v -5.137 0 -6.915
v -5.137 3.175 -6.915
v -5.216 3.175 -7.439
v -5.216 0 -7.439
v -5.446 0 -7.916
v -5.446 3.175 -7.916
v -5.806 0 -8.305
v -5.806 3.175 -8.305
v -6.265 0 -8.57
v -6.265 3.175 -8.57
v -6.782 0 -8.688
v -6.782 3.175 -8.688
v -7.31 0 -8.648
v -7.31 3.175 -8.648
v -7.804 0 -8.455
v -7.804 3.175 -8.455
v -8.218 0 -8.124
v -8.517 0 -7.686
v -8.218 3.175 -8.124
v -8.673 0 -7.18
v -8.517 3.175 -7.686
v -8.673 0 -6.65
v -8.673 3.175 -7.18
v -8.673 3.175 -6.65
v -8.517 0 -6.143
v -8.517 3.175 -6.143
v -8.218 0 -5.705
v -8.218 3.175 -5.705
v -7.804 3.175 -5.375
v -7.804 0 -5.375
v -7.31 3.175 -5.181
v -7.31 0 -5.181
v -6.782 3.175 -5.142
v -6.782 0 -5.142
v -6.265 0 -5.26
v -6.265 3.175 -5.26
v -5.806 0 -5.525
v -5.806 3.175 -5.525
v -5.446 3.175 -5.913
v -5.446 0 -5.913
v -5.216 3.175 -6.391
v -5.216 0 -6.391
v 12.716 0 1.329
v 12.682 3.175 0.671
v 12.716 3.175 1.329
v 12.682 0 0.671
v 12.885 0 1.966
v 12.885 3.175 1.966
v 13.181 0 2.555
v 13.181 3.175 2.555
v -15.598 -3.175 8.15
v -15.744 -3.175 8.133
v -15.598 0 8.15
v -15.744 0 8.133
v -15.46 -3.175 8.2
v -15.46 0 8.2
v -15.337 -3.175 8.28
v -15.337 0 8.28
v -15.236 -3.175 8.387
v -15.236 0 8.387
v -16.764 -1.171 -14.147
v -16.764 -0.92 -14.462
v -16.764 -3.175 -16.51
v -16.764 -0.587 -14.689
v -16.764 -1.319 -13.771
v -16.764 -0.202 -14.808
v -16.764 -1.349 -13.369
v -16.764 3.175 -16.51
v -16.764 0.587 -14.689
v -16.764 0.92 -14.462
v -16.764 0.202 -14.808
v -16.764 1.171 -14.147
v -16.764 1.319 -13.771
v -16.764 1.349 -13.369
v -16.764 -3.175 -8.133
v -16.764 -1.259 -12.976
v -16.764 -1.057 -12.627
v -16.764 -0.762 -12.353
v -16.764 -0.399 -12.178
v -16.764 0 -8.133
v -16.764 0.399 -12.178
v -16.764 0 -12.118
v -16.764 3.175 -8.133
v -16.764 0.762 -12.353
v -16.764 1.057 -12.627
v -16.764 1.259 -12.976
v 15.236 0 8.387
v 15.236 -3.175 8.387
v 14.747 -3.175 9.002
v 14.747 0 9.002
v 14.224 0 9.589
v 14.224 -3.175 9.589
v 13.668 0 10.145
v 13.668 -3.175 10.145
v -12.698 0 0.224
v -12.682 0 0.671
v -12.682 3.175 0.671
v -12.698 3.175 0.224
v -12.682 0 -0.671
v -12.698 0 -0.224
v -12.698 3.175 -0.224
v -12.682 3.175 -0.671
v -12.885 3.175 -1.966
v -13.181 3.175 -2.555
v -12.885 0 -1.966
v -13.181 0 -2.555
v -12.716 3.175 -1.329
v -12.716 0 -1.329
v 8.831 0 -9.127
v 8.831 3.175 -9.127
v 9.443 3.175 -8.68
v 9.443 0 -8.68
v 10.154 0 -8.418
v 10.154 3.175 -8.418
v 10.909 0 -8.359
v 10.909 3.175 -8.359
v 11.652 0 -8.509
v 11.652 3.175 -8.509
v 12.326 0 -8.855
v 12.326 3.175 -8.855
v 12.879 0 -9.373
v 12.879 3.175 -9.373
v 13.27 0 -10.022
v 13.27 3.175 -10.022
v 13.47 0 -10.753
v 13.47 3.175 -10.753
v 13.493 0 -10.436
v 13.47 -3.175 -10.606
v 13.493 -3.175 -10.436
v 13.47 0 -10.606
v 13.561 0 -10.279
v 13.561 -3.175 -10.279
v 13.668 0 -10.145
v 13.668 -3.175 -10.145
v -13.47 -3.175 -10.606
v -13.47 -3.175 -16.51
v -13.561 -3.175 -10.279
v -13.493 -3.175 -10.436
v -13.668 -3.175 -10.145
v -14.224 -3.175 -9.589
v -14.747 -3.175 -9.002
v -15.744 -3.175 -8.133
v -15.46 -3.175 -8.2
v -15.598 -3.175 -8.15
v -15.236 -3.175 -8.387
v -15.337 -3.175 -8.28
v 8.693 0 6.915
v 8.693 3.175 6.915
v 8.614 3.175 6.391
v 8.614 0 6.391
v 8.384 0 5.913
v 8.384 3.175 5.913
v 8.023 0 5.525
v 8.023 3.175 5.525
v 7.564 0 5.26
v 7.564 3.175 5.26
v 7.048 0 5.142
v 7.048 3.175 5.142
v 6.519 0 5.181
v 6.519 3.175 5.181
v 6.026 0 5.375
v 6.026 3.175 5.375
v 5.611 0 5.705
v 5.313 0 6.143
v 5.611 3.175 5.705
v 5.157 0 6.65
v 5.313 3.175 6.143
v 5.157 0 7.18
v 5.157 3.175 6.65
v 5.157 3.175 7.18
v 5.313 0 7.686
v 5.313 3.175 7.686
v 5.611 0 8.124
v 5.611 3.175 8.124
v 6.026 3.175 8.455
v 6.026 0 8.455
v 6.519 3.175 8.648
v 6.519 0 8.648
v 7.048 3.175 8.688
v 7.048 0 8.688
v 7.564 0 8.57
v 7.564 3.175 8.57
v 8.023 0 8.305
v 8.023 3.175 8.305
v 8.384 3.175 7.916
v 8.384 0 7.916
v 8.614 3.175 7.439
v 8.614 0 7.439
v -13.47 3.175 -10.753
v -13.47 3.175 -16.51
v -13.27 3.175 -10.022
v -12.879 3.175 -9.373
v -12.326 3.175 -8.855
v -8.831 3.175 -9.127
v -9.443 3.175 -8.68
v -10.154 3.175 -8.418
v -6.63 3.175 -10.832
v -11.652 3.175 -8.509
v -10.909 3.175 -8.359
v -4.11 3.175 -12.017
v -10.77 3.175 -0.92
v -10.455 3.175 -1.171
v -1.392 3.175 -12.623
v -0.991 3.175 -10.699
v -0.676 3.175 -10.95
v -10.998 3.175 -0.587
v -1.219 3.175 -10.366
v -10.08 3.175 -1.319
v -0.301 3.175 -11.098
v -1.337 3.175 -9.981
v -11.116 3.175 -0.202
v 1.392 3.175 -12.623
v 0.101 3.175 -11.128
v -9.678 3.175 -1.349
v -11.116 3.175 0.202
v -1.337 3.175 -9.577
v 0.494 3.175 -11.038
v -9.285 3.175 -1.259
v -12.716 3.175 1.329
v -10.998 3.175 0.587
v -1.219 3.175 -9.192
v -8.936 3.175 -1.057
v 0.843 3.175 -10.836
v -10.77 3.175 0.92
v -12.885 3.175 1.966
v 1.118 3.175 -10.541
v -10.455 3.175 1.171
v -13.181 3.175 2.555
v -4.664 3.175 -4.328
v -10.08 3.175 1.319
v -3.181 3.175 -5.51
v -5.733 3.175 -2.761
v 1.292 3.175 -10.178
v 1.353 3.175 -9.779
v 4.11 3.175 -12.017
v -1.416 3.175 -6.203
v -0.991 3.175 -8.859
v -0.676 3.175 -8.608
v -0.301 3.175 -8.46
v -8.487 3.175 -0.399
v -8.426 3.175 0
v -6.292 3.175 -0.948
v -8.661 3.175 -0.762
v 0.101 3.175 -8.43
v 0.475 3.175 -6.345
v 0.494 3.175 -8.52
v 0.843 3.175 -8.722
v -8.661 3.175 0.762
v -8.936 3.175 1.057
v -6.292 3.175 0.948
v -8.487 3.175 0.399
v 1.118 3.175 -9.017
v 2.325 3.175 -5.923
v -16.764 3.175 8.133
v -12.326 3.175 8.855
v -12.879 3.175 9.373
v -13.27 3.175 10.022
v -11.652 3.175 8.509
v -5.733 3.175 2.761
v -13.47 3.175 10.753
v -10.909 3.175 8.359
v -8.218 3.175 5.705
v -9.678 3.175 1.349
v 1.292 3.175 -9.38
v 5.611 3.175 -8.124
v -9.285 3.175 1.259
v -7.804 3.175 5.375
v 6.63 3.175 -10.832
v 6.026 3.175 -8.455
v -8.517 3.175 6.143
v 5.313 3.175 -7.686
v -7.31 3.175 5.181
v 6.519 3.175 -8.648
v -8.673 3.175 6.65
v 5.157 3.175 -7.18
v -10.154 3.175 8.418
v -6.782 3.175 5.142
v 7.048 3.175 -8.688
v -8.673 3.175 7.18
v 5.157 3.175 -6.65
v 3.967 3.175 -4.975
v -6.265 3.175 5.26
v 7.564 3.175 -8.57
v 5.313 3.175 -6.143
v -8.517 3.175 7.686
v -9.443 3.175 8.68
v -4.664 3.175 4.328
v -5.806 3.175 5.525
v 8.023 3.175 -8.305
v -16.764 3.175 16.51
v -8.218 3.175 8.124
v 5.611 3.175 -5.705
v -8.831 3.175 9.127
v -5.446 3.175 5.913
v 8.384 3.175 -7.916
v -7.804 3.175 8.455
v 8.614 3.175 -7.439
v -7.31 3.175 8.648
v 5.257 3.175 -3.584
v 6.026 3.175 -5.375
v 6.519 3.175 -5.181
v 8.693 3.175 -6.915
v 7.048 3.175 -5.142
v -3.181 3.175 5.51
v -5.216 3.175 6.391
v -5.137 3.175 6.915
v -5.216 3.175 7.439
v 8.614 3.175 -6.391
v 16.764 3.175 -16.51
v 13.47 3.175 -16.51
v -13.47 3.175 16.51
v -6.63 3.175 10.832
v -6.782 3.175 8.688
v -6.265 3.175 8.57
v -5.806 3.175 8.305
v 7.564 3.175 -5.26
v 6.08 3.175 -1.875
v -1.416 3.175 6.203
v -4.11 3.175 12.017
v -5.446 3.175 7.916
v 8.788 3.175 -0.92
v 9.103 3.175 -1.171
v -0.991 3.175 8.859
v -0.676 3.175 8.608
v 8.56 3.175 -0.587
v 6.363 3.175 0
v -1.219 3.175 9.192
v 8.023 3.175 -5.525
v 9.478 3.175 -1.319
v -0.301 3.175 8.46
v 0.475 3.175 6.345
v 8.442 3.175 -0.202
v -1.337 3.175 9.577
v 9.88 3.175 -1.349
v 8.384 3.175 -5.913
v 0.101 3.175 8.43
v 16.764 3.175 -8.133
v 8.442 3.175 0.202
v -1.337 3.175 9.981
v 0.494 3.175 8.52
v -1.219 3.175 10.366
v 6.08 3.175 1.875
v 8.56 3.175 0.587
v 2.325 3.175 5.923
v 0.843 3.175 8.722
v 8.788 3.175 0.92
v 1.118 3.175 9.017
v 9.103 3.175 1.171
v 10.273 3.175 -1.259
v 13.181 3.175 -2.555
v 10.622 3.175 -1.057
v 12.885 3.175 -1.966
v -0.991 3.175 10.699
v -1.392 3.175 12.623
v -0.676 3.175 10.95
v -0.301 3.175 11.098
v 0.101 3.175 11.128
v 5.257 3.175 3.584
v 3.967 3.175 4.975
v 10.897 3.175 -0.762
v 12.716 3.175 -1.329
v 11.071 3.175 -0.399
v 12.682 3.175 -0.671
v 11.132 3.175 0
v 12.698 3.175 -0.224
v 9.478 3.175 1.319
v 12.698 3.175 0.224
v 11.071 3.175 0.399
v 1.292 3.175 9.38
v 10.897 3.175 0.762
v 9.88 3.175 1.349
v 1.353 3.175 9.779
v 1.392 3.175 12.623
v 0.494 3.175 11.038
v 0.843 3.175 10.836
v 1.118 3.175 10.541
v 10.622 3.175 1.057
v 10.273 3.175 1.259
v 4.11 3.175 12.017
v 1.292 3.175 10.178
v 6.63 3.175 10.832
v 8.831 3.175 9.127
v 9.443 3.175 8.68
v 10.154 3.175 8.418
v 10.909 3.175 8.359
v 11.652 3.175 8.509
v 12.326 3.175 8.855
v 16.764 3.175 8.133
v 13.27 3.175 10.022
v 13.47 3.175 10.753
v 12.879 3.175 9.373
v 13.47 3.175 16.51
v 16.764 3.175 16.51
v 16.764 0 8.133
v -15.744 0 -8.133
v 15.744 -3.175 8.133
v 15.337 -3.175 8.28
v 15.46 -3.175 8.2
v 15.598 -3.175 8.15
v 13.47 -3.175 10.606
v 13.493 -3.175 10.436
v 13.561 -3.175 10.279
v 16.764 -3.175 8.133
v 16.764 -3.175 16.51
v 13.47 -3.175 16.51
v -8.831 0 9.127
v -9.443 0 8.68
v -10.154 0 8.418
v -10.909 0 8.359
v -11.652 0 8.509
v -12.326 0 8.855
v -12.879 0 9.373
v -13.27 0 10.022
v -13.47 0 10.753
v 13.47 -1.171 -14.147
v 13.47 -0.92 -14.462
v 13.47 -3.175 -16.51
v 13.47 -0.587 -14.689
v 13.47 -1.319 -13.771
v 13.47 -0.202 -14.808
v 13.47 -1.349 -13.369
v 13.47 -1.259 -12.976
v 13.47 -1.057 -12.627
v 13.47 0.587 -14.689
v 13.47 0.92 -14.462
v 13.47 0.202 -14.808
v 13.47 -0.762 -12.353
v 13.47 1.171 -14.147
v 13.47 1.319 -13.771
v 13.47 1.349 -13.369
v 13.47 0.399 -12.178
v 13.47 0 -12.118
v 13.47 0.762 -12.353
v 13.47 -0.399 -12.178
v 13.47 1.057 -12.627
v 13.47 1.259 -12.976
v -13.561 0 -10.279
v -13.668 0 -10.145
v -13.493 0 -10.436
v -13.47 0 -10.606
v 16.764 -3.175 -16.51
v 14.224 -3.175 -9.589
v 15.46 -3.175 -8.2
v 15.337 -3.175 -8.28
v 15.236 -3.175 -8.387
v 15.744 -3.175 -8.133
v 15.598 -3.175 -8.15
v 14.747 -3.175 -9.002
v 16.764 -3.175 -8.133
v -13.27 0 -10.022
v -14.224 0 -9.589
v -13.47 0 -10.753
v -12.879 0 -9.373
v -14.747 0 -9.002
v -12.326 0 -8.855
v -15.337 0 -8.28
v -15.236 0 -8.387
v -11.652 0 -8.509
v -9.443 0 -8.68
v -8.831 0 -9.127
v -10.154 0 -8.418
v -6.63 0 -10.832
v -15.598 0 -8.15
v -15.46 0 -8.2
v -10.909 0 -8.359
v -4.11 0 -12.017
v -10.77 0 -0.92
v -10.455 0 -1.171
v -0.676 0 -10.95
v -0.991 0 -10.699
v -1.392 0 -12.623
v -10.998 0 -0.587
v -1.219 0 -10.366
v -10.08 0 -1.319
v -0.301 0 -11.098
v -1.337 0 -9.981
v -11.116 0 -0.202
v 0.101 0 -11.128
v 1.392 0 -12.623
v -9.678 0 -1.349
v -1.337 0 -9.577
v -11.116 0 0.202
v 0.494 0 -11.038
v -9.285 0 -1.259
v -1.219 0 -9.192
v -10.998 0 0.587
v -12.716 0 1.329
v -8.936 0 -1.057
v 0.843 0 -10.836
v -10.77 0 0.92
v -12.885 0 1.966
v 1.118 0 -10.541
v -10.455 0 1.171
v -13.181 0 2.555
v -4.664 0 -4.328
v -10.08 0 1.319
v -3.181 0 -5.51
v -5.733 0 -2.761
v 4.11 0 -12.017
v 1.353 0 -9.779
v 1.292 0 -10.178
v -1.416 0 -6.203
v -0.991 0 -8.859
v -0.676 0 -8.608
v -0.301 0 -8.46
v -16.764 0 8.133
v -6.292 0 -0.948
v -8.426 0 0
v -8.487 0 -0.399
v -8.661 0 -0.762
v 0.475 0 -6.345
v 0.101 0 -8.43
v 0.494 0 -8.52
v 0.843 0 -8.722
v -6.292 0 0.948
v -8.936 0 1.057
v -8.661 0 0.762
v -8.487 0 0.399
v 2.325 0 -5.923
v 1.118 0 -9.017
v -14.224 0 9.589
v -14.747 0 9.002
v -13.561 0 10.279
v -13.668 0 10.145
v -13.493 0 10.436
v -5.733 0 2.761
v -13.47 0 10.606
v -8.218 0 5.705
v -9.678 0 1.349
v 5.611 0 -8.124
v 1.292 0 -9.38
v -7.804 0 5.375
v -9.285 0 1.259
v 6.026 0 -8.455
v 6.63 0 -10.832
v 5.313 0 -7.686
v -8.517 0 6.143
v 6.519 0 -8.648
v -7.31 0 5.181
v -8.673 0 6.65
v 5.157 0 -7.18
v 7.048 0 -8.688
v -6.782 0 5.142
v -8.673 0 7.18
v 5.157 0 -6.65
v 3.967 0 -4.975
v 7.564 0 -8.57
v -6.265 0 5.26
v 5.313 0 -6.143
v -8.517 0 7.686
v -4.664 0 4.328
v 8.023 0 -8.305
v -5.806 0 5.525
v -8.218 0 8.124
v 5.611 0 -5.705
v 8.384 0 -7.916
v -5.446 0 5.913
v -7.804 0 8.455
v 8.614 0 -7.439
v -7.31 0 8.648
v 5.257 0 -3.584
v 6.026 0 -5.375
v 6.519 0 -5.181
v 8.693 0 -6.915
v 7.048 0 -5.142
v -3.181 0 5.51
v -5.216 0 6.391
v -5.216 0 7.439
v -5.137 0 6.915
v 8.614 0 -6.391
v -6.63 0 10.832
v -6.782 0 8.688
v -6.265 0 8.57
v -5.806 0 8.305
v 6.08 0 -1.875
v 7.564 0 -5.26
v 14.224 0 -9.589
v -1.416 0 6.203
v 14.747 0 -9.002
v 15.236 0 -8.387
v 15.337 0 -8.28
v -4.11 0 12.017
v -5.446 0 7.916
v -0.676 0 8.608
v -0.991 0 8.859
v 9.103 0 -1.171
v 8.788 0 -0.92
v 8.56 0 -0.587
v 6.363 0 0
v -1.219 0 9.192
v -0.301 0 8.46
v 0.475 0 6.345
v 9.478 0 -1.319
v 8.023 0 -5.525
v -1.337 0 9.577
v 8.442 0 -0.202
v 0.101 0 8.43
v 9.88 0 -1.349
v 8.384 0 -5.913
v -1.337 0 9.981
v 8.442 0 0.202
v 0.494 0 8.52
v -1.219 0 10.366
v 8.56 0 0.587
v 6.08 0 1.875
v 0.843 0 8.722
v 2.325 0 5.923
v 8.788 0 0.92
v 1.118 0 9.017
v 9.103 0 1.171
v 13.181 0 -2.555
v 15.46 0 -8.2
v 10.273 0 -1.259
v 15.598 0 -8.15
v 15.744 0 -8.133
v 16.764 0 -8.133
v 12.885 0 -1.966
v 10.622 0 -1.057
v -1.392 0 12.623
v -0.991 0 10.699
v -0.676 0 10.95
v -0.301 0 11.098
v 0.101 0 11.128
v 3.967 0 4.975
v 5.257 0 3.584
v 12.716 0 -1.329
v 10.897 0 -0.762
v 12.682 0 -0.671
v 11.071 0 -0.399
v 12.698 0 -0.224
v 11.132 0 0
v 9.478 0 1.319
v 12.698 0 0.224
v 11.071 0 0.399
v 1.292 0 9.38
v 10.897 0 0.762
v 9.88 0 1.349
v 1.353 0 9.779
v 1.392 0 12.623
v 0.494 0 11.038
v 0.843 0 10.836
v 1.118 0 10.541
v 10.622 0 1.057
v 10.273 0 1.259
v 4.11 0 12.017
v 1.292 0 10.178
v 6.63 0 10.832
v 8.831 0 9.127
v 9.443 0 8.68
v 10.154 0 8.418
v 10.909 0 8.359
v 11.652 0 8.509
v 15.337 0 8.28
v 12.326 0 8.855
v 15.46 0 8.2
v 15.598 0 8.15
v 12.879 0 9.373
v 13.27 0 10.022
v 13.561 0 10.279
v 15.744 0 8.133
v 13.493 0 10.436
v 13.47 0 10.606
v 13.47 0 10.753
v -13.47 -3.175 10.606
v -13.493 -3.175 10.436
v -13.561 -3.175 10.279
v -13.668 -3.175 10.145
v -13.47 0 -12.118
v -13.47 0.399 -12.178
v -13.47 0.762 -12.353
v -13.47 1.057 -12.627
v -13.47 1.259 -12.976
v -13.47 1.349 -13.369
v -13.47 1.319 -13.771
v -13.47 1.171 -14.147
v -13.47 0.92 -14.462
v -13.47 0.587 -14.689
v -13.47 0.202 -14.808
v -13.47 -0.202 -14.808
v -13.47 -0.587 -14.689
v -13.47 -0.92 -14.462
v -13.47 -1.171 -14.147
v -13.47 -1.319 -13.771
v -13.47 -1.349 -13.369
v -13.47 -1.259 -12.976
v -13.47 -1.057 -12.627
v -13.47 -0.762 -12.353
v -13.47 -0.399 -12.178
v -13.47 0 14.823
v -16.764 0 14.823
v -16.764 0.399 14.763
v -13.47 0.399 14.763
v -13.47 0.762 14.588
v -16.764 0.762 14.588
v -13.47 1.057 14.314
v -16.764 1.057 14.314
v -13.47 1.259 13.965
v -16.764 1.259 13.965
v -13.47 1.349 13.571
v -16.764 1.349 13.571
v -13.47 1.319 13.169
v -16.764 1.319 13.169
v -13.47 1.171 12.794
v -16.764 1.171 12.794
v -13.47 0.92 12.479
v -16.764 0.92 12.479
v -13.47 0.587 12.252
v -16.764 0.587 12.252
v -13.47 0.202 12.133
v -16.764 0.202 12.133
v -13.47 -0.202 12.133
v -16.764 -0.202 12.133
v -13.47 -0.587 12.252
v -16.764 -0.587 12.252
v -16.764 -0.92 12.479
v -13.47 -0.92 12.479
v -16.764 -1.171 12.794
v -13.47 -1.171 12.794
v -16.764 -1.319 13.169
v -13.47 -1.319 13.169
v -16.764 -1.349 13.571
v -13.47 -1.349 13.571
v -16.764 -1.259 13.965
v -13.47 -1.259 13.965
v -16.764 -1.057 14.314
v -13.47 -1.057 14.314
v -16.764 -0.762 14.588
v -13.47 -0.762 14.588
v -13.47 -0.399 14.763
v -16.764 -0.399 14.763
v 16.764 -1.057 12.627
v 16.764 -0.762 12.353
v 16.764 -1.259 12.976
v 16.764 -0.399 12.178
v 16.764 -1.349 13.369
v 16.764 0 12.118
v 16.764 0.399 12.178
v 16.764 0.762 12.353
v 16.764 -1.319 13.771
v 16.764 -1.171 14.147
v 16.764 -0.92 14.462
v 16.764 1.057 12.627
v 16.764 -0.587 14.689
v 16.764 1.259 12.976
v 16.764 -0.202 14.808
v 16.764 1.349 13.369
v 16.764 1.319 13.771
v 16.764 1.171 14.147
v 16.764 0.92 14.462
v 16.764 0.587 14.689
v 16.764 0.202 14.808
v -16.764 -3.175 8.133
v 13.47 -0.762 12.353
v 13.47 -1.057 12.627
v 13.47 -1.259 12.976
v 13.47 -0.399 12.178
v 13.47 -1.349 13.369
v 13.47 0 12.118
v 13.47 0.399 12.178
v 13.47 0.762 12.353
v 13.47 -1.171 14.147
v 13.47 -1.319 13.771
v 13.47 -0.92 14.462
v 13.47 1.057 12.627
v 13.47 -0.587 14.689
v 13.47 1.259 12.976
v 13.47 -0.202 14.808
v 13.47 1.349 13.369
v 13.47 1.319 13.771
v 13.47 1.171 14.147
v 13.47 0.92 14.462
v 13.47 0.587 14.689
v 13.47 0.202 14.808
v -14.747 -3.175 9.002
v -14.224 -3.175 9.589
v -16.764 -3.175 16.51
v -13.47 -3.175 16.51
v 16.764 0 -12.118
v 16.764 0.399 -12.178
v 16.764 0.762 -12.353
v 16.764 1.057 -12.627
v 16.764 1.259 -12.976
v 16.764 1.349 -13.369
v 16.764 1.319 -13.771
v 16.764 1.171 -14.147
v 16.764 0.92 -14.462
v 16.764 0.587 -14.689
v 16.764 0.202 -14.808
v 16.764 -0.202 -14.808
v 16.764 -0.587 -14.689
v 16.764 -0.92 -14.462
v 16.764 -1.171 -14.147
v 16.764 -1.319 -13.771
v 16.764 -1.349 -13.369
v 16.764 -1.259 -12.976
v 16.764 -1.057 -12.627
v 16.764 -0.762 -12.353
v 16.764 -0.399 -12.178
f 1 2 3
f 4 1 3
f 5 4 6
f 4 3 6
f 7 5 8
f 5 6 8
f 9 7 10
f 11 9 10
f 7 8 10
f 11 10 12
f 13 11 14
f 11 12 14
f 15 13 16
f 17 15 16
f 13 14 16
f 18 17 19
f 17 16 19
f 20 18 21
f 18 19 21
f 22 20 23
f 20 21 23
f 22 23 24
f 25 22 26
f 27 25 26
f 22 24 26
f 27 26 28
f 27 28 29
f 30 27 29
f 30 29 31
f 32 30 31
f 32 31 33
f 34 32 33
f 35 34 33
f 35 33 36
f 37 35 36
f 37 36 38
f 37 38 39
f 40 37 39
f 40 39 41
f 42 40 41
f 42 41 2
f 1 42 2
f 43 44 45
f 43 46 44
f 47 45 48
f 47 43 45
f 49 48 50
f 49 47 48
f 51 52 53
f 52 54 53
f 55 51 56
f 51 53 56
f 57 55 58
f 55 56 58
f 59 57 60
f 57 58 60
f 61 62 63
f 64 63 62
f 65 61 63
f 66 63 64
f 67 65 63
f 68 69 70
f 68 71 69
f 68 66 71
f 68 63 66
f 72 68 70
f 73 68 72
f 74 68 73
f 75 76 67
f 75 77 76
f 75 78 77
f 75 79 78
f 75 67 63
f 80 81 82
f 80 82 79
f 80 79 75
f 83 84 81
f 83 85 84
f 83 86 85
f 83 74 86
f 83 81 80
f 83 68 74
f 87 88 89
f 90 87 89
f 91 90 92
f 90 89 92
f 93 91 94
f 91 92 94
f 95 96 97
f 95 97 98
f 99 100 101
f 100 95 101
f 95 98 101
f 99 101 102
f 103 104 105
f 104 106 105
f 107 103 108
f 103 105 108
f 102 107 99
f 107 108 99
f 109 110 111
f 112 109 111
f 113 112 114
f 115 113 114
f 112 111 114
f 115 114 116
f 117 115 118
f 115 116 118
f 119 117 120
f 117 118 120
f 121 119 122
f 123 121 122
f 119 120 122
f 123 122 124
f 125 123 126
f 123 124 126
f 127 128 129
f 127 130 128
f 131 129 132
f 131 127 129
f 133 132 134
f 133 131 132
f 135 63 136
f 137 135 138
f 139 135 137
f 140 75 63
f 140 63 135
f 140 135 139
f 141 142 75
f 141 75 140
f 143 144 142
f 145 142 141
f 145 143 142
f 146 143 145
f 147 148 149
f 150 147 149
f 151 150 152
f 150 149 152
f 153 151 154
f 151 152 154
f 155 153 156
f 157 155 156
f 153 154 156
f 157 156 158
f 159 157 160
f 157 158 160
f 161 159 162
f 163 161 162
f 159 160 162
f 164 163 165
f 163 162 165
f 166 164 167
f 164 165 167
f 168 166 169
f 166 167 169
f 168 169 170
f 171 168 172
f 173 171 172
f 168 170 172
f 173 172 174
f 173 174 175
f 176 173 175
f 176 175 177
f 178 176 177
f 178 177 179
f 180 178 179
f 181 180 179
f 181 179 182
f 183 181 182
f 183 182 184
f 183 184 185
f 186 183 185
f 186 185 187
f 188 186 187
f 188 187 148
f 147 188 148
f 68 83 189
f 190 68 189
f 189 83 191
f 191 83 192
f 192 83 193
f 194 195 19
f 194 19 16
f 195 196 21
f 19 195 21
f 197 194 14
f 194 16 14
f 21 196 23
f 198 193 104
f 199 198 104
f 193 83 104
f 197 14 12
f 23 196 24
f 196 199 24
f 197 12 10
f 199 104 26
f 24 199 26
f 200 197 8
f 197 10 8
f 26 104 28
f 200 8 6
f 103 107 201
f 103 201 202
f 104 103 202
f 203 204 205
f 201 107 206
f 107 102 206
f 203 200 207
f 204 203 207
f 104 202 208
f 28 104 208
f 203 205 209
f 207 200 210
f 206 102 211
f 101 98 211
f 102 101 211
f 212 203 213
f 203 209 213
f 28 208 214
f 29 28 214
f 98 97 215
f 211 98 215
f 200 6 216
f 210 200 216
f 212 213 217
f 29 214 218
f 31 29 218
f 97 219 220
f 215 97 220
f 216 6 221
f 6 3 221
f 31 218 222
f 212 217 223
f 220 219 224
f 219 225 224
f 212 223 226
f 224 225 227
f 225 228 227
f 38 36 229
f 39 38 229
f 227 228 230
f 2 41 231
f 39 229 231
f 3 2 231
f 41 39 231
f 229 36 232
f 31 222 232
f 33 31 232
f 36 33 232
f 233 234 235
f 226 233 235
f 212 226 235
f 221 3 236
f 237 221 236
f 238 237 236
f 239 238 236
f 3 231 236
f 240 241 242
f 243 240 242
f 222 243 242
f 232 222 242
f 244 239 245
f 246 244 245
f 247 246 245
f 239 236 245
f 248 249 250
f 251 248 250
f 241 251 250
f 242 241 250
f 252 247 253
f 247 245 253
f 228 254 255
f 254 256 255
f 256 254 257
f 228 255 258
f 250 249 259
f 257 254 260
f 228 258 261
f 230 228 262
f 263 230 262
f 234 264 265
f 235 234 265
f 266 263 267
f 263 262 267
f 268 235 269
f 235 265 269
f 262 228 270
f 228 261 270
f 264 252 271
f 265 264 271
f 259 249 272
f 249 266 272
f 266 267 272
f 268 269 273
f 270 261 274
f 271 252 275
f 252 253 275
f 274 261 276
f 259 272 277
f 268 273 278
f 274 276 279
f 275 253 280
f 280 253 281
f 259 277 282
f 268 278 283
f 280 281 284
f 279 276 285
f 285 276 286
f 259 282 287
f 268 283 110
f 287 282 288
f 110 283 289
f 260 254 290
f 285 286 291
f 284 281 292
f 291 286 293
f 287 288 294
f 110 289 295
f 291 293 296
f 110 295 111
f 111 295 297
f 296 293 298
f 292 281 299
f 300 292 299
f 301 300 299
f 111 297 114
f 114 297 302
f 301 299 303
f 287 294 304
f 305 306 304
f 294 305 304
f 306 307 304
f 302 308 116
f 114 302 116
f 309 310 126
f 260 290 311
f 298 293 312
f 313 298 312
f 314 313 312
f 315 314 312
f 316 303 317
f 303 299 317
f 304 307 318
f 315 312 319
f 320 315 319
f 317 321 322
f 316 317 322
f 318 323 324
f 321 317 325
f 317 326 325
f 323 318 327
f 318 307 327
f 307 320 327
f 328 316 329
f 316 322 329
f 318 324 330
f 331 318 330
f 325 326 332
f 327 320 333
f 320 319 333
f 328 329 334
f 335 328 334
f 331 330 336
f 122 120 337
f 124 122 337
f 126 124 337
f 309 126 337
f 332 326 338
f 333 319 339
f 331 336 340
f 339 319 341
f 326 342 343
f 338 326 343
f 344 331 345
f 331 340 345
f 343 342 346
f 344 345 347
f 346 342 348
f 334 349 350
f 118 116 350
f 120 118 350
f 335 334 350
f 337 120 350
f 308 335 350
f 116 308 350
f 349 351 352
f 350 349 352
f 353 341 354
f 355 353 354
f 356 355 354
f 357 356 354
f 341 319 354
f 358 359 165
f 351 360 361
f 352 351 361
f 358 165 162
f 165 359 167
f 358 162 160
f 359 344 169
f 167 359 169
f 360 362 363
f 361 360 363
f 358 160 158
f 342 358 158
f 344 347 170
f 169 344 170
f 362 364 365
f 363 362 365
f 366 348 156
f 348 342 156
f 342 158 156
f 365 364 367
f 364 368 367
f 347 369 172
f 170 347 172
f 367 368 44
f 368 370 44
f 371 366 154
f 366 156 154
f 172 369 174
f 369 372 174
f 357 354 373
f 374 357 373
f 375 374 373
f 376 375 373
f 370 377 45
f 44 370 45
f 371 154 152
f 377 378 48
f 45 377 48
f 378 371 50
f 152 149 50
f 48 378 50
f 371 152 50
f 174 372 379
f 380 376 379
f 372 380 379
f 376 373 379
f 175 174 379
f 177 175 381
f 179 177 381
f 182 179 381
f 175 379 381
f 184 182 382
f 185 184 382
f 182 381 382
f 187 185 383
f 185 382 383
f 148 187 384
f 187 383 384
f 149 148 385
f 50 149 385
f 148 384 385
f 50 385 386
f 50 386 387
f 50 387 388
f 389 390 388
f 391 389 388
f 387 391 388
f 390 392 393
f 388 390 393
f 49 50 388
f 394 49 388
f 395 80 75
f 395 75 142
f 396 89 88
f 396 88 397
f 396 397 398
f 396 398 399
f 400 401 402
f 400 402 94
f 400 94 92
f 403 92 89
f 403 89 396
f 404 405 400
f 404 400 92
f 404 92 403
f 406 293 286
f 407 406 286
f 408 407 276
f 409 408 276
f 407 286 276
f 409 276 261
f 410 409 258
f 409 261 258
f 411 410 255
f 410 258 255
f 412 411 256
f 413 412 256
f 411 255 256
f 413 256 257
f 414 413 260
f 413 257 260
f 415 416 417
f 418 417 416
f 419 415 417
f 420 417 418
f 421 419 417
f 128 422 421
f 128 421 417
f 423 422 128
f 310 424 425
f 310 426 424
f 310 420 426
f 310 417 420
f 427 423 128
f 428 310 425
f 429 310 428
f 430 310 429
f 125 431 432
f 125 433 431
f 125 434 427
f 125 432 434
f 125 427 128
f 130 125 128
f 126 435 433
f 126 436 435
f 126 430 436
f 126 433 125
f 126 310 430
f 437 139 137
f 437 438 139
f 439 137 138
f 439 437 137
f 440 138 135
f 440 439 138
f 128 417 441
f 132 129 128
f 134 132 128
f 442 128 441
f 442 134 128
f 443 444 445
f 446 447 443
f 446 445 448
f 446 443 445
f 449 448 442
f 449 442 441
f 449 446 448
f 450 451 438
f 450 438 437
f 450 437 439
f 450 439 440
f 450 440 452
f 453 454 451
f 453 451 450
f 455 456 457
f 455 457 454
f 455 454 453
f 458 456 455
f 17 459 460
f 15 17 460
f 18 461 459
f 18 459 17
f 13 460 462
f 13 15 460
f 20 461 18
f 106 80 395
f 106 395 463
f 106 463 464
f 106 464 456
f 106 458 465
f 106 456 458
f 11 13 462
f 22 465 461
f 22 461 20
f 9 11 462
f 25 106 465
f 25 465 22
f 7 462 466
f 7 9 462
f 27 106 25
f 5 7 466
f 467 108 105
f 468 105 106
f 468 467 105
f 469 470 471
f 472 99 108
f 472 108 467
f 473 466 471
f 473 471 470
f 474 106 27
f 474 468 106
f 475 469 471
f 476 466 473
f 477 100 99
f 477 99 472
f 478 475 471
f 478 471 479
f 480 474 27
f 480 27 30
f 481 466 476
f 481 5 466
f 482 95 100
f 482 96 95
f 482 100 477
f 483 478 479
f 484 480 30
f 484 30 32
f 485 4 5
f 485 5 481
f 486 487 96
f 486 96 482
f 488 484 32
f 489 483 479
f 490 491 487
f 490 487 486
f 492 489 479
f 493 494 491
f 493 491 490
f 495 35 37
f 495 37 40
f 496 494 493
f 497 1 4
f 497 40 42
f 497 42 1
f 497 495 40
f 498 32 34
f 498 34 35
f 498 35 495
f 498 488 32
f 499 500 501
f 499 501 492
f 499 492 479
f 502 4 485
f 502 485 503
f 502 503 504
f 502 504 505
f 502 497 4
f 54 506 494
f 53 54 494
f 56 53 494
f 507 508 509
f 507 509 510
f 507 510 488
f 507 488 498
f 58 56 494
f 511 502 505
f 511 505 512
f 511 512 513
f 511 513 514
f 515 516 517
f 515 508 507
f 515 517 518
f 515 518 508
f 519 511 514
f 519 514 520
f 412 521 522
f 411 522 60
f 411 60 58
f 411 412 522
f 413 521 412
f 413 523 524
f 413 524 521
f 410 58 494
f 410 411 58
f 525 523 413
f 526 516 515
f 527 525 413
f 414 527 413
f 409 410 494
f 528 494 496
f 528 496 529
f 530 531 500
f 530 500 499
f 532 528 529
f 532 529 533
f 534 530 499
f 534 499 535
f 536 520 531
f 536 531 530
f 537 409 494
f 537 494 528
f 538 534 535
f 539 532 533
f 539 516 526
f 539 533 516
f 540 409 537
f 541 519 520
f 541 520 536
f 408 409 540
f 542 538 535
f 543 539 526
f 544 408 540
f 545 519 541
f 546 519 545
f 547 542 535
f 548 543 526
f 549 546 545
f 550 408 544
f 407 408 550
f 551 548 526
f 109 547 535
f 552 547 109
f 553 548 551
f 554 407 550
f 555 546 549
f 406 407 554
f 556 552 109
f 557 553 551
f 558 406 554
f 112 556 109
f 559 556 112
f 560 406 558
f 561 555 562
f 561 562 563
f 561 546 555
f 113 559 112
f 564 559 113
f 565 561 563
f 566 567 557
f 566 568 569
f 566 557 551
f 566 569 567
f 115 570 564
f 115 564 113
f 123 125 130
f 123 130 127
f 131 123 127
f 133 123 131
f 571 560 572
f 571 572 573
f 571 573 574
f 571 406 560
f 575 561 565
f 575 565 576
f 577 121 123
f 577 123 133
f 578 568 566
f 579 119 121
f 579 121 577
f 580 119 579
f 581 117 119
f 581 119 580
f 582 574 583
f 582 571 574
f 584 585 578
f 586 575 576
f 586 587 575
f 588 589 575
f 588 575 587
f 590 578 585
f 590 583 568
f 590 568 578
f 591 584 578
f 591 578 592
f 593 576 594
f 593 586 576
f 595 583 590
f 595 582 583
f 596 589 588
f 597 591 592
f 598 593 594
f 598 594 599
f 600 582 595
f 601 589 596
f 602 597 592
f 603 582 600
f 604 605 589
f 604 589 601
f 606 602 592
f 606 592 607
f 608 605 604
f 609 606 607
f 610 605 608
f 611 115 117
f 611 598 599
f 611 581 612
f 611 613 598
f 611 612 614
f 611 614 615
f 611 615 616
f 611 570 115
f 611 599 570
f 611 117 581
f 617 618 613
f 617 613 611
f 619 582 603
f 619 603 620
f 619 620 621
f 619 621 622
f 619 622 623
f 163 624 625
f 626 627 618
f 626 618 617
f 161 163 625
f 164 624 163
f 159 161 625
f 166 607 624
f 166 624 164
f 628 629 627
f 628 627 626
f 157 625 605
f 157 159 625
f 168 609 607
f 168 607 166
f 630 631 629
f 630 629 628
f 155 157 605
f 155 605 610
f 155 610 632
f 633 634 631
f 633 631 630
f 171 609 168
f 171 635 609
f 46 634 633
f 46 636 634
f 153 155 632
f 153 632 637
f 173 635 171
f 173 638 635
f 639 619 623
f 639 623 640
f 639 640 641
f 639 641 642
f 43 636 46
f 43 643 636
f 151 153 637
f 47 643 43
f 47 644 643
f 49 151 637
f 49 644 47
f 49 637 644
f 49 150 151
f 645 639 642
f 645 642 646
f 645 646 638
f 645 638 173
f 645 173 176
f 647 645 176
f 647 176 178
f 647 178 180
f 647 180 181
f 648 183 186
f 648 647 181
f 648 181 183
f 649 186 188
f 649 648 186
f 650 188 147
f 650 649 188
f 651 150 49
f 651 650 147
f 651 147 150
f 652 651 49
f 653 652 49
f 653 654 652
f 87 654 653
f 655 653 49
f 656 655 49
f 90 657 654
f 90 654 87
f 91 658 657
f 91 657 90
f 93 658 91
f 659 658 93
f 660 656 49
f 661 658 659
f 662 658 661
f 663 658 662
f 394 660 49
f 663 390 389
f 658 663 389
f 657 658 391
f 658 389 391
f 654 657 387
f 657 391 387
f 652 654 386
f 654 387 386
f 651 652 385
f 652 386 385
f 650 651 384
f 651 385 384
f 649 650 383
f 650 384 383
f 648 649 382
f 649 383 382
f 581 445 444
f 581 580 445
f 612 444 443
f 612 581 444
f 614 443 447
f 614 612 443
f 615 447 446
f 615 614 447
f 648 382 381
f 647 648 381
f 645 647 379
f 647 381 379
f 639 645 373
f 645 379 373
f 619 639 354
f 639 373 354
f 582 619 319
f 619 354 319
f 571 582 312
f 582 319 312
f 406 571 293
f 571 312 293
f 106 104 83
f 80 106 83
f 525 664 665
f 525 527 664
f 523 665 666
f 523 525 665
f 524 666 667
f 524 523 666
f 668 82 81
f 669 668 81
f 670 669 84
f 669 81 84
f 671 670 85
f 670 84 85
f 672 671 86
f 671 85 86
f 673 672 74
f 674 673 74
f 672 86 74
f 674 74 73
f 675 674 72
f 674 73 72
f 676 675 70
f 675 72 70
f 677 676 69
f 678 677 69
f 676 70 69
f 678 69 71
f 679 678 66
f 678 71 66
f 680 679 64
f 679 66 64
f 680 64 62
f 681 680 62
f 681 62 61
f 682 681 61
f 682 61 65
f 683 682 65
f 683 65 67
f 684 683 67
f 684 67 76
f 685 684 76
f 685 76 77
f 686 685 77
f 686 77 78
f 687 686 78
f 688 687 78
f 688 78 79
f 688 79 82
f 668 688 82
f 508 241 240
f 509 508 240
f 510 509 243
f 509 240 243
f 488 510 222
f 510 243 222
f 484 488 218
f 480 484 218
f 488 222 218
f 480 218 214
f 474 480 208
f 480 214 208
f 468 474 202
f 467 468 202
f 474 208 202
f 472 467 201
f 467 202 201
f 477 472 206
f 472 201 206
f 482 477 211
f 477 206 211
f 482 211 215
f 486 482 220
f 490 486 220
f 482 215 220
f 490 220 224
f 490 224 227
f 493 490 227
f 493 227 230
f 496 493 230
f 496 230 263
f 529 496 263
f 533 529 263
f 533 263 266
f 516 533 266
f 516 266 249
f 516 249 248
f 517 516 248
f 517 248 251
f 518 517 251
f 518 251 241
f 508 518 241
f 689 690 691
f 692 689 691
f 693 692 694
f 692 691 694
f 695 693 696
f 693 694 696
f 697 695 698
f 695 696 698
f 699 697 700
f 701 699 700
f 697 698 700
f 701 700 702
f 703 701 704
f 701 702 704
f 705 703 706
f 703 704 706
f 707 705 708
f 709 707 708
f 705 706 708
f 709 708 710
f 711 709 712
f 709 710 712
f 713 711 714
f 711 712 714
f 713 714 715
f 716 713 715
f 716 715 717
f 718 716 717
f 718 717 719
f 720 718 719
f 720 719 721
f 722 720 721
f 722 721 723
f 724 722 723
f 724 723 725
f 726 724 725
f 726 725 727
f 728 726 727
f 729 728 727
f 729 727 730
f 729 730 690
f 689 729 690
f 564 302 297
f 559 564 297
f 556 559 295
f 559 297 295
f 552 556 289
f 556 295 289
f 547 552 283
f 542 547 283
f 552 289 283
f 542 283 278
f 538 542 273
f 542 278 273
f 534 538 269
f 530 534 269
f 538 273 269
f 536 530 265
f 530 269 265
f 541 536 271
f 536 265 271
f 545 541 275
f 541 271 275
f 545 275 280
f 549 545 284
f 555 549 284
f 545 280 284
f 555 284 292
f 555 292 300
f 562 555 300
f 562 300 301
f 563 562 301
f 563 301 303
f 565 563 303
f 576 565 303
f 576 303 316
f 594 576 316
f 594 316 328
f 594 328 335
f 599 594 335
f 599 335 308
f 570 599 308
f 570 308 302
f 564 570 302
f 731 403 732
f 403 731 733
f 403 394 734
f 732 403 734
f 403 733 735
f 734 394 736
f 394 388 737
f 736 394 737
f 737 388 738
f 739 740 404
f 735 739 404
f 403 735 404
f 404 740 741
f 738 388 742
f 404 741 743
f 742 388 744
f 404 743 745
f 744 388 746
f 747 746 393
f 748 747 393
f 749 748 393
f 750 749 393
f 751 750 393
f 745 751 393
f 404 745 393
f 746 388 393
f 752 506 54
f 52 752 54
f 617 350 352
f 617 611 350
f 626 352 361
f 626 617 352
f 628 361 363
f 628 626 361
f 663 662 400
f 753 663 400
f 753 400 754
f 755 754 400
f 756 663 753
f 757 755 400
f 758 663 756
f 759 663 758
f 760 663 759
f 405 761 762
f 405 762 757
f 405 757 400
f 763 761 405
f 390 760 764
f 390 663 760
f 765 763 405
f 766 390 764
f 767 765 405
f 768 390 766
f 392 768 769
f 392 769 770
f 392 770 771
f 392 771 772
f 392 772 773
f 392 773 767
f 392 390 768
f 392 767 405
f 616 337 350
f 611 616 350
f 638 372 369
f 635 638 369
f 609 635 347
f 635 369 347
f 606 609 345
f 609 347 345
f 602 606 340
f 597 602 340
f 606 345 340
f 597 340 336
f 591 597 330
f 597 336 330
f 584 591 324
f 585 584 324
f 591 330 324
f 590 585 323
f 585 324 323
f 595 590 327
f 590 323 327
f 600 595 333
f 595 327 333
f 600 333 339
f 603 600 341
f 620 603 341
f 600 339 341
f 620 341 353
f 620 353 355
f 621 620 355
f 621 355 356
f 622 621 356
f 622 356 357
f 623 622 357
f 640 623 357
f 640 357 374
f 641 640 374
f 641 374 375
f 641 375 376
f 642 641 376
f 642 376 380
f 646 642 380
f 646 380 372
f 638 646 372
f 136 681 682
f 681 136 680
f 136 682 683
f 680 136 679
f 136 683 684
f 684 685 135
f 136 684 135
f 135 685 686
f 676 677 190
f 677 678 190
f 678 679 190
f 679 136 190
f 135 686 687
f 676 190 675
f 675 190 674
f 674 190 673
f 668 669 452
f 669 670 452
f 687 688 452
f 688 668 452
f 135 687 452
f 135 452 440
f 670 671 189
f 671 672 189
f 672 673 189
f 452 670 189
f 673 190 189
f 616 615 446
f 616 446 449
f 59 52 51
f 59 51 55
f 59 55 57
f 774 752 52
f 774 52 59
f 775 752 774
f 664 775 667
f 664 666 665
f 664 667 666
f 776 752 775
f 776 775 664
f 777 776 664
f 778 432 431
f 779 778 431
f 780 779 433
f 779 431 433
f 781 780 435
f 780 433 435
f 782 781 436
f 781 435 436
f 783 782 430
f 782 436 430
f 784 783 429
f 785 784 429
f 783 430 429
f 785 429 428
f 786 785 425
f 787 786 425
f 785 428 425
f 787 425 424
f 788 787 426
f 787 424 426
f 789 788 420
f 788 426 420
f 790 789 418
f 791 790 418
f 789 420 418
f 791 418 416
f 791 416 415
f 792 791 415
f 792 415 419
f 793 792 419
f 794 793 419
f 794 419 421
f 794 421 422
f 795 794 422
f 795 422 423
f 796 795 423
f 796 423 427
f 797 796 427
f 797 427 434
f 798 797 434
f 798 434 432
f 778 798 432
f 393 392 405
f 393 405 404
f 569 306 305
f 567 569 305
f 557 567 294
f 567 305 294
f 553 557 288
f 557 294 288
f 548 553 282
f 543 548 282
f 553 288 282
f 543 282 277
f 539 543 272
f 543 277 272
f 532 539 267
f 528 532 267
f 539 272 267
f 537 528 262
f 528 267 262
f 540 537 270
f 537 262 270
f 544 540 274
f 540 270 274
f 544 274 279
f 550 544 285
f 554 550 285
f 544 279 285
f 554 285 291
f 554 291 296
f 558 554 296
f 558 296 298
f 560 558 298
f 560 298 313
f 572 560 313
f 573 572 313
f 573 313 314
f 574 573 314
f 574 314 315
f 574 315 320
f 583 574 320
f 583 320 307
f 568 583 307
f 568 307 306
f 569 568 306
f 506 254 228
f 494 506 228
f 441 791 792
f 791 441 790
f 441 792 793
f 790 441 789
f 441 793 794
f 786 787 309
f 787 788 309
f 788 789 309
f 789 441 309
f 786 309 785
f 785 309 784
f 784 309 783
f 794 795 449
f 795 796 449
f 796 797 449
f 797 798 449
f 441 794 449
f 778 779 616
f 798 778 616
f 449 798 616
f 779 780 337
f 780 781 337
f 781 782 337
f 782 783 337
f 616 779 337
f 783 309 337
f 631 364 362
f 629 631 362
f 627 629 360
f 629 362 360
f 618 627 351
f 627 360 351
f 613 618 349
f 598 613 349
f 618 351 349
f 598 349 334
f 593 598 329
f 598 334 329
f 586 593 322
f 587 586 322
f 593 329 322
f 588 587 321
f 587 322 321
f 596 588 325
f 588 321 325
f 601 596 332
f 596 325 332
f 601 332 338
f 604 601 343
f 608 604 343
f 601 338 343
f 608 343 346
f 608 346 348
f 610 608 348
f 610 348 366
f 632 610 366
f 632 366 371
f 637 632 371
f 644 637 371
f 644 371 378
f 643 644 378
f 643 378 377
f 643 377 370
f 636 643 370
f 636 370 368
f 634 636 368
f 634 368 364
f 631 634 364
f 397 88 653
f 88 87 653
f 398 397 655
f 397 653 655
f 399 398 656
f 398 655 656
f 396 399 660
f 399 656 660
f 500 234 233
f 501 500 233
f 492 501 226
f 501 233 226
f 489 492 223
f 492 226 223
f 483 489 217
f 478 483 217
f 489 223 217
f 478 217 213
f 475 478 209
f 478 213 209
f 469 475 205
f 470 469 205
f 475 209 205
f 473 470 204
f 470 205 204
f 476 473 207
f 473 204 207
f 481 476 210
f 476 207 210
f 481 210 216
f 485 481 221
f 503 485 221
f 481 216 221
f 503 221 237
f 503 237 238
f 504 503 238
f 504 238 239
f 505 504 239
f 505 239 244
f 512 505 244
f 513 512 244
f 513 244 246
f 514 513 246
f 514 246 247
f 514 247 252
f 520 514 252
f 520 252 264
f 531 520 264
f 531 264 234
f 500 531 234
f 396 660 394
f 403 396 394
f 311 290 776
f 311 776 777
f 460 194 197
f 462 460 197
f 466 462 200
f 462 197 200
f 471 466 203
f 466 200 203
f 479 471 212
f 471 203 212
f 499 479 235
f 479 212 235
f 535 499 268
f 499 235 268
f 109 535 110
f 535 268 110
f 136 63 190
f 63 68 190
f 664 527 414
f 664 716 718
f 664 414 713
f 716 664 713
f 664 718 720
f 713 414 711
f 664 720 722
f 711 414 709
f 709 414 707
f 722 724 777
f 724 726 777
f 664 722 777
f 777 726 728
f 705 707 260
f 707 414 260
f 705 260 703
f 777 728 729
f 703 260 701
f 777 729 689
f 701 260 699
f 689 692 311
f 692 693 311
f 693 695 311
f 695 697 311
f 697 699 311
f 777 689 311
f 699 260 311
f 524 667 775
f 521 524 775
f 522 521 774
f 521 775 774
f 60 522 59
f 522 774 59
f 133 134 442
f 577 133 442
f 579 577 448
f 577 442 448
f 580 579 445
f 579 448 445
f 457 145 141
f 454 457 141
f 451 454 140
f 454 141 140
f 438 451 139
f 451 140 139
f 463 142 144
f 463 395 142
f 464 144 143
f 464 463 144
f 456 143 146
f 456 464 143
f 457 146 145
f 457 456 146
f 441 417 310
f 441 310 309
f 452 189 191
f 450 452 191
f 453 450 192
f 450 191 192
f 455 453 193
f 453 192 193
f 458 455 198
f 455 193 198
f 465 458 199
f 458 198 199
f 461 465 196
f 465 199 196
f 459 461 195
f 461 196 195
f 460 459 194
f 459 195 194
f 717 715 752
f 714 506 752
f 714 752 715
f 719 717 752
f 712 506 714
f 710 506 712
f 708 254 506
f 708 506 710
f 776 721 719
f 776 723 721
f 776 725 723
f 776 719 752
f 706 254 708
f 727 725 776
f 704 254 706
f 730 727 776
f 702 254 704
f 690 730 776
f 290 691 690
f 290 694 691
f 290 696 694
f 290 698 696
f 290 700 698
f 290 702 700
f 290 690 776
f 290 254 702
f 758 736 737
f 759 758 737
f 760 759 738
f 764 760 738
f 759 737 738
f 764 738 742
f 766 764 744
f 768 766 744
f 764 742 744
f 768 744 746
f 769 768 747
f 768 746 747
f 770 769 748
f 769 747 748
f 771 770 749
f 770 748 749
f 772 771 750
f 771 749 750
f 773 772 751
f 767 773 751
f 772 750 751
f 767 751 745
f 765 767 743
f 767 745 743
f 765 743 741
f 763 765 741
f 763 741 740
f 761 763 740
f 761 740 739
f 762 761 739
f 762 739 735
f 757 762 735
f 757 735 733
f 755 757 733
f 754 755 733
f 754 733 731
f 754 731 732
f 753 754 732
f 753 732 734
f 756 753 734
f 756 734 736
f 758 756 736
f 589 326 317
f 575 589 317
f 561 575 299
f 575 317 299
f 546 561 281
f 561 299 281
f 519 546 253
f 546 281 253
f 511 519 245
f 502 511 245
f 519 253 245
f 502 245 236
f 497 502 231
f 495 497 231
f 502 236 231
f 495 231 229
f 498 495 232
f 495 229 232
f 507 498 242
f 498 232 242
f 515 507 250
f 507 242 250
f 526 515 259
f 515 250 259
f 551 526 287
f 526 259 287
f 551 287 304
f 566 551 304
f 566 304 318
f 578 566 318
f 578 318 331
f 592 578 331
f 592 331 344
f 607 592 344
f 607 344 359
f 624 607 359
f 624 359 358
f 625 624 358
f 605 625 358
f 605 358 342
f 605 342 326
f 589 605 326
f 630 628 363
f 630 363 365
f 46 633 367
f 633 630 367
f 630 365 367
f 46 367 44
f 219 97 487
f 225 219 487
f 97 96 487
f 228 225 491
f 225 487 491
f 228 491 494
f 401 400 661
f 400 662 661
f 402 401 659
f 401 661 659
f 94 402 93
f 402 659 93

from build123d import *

# Parameters (mm, degrees)
SKETCH1_W                  = 33.528
SKETCH1_H                  = 33.02
BOSS_EXTRUDE1_DEPTH        = 3.175
CUT_EXTRUDE1_DEPTH         = 4.175
SKETCH3_W                  = 3.29438
SKETCH3_H                  = 8.37692
BOSS_EXTRUDE2_DEPTH        = 3.175
CUT_EXTRUDE2_DEPTH         = 7.35
SKETCH5_W                  = 3.29438
SKETCH5_H                  = 8.37692
BOSS_EXTRUDE3_DEPTH        = 3.175
CUT_EXTRUDE3_DEPTH         = 7.35
SKETCH7_W                  = 3.29438
SKETCH7_H                  = 8.37692
BOSS_EXTRUDE4_DEPTH        = 3.175
CUT_EXTRUDE4_DEPTH         = 7.35
SKETCH9_W                  = 3.29438
SKETCH9_H                  = 8.37692
BOSS_EXTRUDE5_DEPTH        = 3.175
CUT_EXTRUDE5_DEPTH         = 3.175
CUT_EXTRUDE6_DEPTH         = 3.175
CUT_EXTRUDE7_DEPTH         = 3.175
CUT_EXTRUDE8_DEPTH         = 3.175
HOLE1_D                    = 12.7254
HOLE1_DEPTH                = 3.175025
M2_5_CLEARANCE_HOLE1_D     = 2.7051
M2_5_CLEARANCE_HOLE1_DEPTH = 3.175025
M3_CLEARANCE_HOLE1_D       = 3.556
M3_CLEARANCE_HOLE1_DEPTH   = 3.175025
M2_5_CLEARANCE_HOLE2_D     = 2.7051
M2_5_CLEARANCE_HOLE2_DEPTH = 3.29438
M2_5_CLEARANCE_HOLE3_D     = 2.7051
M2_5_CLEARANCE_HOLE3_DEPTH = 3.29438
M2_5_CLEARANCE_HOLE4_D     = 2.7051
M2_5_CLEARANCE_HOLE4_DEPTH = 3.29443
FILLET1_R                  = 0.635
FILLET2_R                  = 3.175


with BuildPart() as part:
    # Sketch1 → Boss-Extrude1 (new body)
    with BuildSketch(Plane.XZ):
        Rectangle(SKETCH1_W, SKETCH1_H)
    extrude(amount=-BOSS_EXTRUDE1_DEPTH)

    # Sketch2 → Cut-Extrude1 (cut, through all)
    with BuildSketch(Plane(origin=(0, 3.175, 0), x_dir=(-1, 0, 0), z_dir=(0, 1, 0))):
        with BuildLine():
            Line((-13.46962, 16.51), (-13.46962, 10.753335779))
            ThreePointArc((-13.46962, 10.753335779), (-11.652039651, 8.508623021), (-8.8307675, 9.127296717))
            ThreePointArc((-8.8307675, 9.127296717), (0, 12.7), (8.8307675, 9.127296717))
            ThreePointArc((8.8307675, 9.127296717), (11.652039651, 8.508623021), (13.46962, 10.753335779))
            Line((13.46962, 10.753335779), (13.46962, 16.51))
            Line((13.46962, 16.51), (-13.46962, 16.51))
        make_face()
    extrude(amount=-CUT_EXTRUDE1_DEPTH, mode=Mode.SUBTRACT)

    # Sketch3 → Boss-Extrude2 (add)
    with BuildSketch(Plane.XZ):
        with Locations((-15.11681, 12.32154)):
            Rectangle(SKETCH3_W, SKETCH3_H)
    extrude(amount=BOSS_EXTRUDE2_DEPTH)

    # Sketch4 → Cut-Extrude2 (cut, through all)
    with BuildSketch(Plane(origin=(0, 3.175, 0), x_dir=(-1, 0, 0), z_dir=(0, 1, 0))):
        with BuildLine():
            Line((-16.764, 8.13308), (-16.764, -8.13308))
            Line((-16.764, -8.13308), (-12.593680427, -1.639882101))
            ThreePointArc((-12.593680427, -1.639882101), (-12.7, 0), (-12.593680427, 1.639882101))
            Line((-12.593680427, 1.639882101), (-16.764, 8.13308))
        make_face()
    extrude(amount=-CUT_EXTRUDE2_DEPTH, mode=Mode.SUBTRACT)

    # Sketch5 → Boss-Extrude3 (add)
    with BuildSketch(Plane.XZ):
        with Locations((15.11681, 12.32154)):
            Rectangle(SKETCH5_W, SKETCH5_H)
    extrude(amount=BOSS_EXTRUDE3_DEPTH)

    # Sketch6 → Cut-Extrude3 (cut, through all)
    with BuildSketch(Plane(origin=(0, 3.175, 0), x_dir=(-1, 0, 0), z_dir=(0, 1, 0))):
        with BuildLine():
            Line((13.46962, -16.51), (13.46962, -10.753335779))
            ThreePointArc((13.46962, -10.753335779), (11.652039651, -8.508623021), (8.8307675, -9.127296717))
            ThreePointArc((8.8307675, -9.127296717), (0, -12.7), (-8.8307675, -9.127296717))
            ThreePointArc((-8.8307675, -9.127296717), (-11.652039651, -8.508623021), (-13.46962, -10.753335779))
            Line((-13.46962, -10.753335779), (-13.46962, -16.51))
            Line((-13.46962, -16.51), (13.46962, -16.51))
        make_face()
    extrude(amount=-CUT_EXTRUDE3_DEPTH, mode=Mode.SUBTRACT)

    # Sketch7 → Boss-Extrude4 (add)
    with BuildSketch(Plane.XZ):
        with Locations((15.11681, -12.32154)):
            Rectangle(SKETCH7_W, SKETCH7_H)
    extrude(amount=BOSS_EXTRUDE4_DEPTH)

    # Sketch8 → Cut-Extrude4 (cut, through all)
    with BuildSketch(Plane(origin=(0, 3.175, 0), x_dir=(-1, 0, 0), z_dir=(0, 1, 0))):
        with BuildLine():
            Line((16.764, -8.13308), (16.764, 8.13308))
            Line((16.764, 8.13308), (12.593680427, 1.639882101))
            ThreePointArc((12.593680427, 1.639882101), (12.7, 0), (12.593680427, -1.639882101))
            Line((12.593680427, -1.639882101), (16.764, -8.13308))
        make_face()
    extrude(amount=-CUT_EXTRUDE4_DEPTH, mode=Mode.SUBTRACT)

    # Sketch9 → Boss-Extrude5 (add)
    with BuildSketch(Plane.XZ):
        with Locations((-15.11681, -12.32154)):
            Rectangle(SKETCH9_W, SKETCH9_H)
    extrude(amount=BOSS_EXTRUDE5_DEPTH)

    # Sketch10 → Cut-Extrude5 (cut)
    with BuildSketch(Plane.XZ.offset(3.175)):
        with BuildLine():
            Line((15.422429016, -8.13308), (13.46962, -8.13308))
            Line((13.46962, -8.13308), (13.46962, -10.329337463))
            ThreePointArc((13.46962, -10.329337463), (14.503938678, -9.282703292), (15.422429016, -8.13308))
        make_face()
    extrude(amount=-CUT_EXTRUDE5_DEPTH, mode=Mode.SUBTRACT)

    # Sketch11 → Cut-Extrude6 (cut)
    with BuildSketch(Plane.XZ.offset(3.175)):
        with BuildLine():
            Line((13.46962, 10.329337463), (13.46962, 8.13308))
            Line((13.46962, 8.13308), (15.422429016, 8.13308))
            ThreePointArc((15.422429016, 8.13308), (14.503938678, 9.282703292), (13.46962, 10.329337463))
        make_face()
    extrude(amount=-CUT_EXTRUDE6_DEPTH, mode=Mode.SUBTRACT)

    # Sketch12 → Cut-Extrude7 (cut)
    with BuildSketch(Plane.XZ.offset(3.175)):
        with BuildLine():
            Line((-15.422429016, 8.13308), (-13.46962, 8.13308))
            Line((-13.46962, 8.13308), (-13.46962, 10.329337463))
            ThreePointArc((-13.46962, 10.329337463), (-14.503938678, 9.282703292), (-15.422429016, 8.13308))
        make_face()
    extrude(amount=-CUT_EXTRUDE7_DEPTH, mode=Mode.SUBTRACT)

    # Sketch13 → Cut-Extrude8 (cut)
    with BuildSketch(Plane.XZ.offset(3.175)):
        with BuildLine():
            Line((-13.46962, -10.329337463), (-13.46962, -8.13308))
            Line((-13.46962, -8.13308), (-15.422429016, -8.13308))
            ThreePointArc((-15.422429016, -8.13308), (-14.503938678, -9.282703292), (-13.46962, -10.329337463))
        make_face()
    extrude(amount=-CUT_EXTRUDE8_DEPTH, mode=Mode.SUBTRACT)

    # Hole1
    with Locations(Plane(origin=(0, 0, 0), x_dir=(-1, 0, 0), z_dir=(0, -1, 0))):
        with Locations((0, 0)):
            Hole(HOLE1_D / 2, depth=HOLE1_DEPTH)

    # M2.5 Clearance Hole1
    with Locations(Plane(origin=(0, 0, 0), x_dir=(-1, 0, 0), z_dir=(0, -1, 0))):
        with Locations((0, -9.779), (9.779, 0), (0, 9.779), (-9.779, 0)):
            Hole(M2_5_CLEARANCE_HOLE1_D / 2, depth=M2_5_CLEARANCE_HOLE1_DEPTH)

    # M3 Clearance Hole1
    with Locations(Plane(origin=(0, 0, 0), x_dir=(-1, 0, 0), z_dir=(0, -1, 0))):
        with Locations((6.914797213, -6.914797213), (6.914797213, 6.914797213), (-6.914797213, 6.914797213), (-6.914797213, -6.914797213)):
            Hole(M3_CLEARANCE_HOLE1_D / 2, depth=M3_CLEARANCE_HOLE1_DEPTH)

    # M2.5 Clearance Hole2
    with Locations(Plane(origin=(16.764, 0, 0), x_dir=(0, 0, -1), z_dir=(1, 0, 0))):
        with Locations((13.470384182, 0)):
            Hole(M2_5_CLEARANCE_HOLE2_D / 2, depth=M2_5_CLEARANCE_HOLE2_DEPTH)

    # M2.5 Clearance Hole3
    with Locations(Plane.ZY.offset(-13.46962)):
        with Locations((13.470384182, 0)):
            Hole(M2_5_CLEARANCE_HOLE3_D / 2, depth=M2_5_CLEARANCE_HOLE3_DEPTH)

    # M2.5 Clearance Hole4
    with Locations(Plane(origin=(-13.46962, 0, 0), x_dir=(0, 0, -1), z_dir=(1, 0, 0))):
        with Locations((-13.470384182, 0), (13.470384182, 0)):
            Hole(M2_5_CLEARANCE_HOLE4_D / 2, depth=M2_5_CLEARANCE_HOLE4_DEPTH)

    # Fillet1
    fillet1_edges = [part.edges().sort_by_distance(p)[0] for p in [
        (-13.46962, -1.5875, -10.329337463),
        (-15.422429016, -1.5875, 8.13308),
        (15.422429016, -1.5875, -8.13308),
        (15.422429016, -1.5875, 8.13308),
        (13.46962, -1.5875, -10.329337463),
        (-13.46962, -1.5875, 10.329337463),
        (-15.422429016, -1.5875, -8.13308),
        (13.46962, -1.5875, 10.329337463),
    ]]
    fillet(fillet1_edges, radius=FILLET1_R)

    # Fillet2
    fillet2_edges = [part.edges().sort_by_distance(p)[0] for p in [
        (-12.593680427, 1.5875, -1.639882101),
        (12.593680427, 1.5875, -1.639882101),
        (-12.593680427, 1.5875, 1.639882101),
        (12.593680427, 1.5875, 1.639882101),
    ]]
    fillet(fillet2_edges, radius=FILLET2_R)


solid = part.part
